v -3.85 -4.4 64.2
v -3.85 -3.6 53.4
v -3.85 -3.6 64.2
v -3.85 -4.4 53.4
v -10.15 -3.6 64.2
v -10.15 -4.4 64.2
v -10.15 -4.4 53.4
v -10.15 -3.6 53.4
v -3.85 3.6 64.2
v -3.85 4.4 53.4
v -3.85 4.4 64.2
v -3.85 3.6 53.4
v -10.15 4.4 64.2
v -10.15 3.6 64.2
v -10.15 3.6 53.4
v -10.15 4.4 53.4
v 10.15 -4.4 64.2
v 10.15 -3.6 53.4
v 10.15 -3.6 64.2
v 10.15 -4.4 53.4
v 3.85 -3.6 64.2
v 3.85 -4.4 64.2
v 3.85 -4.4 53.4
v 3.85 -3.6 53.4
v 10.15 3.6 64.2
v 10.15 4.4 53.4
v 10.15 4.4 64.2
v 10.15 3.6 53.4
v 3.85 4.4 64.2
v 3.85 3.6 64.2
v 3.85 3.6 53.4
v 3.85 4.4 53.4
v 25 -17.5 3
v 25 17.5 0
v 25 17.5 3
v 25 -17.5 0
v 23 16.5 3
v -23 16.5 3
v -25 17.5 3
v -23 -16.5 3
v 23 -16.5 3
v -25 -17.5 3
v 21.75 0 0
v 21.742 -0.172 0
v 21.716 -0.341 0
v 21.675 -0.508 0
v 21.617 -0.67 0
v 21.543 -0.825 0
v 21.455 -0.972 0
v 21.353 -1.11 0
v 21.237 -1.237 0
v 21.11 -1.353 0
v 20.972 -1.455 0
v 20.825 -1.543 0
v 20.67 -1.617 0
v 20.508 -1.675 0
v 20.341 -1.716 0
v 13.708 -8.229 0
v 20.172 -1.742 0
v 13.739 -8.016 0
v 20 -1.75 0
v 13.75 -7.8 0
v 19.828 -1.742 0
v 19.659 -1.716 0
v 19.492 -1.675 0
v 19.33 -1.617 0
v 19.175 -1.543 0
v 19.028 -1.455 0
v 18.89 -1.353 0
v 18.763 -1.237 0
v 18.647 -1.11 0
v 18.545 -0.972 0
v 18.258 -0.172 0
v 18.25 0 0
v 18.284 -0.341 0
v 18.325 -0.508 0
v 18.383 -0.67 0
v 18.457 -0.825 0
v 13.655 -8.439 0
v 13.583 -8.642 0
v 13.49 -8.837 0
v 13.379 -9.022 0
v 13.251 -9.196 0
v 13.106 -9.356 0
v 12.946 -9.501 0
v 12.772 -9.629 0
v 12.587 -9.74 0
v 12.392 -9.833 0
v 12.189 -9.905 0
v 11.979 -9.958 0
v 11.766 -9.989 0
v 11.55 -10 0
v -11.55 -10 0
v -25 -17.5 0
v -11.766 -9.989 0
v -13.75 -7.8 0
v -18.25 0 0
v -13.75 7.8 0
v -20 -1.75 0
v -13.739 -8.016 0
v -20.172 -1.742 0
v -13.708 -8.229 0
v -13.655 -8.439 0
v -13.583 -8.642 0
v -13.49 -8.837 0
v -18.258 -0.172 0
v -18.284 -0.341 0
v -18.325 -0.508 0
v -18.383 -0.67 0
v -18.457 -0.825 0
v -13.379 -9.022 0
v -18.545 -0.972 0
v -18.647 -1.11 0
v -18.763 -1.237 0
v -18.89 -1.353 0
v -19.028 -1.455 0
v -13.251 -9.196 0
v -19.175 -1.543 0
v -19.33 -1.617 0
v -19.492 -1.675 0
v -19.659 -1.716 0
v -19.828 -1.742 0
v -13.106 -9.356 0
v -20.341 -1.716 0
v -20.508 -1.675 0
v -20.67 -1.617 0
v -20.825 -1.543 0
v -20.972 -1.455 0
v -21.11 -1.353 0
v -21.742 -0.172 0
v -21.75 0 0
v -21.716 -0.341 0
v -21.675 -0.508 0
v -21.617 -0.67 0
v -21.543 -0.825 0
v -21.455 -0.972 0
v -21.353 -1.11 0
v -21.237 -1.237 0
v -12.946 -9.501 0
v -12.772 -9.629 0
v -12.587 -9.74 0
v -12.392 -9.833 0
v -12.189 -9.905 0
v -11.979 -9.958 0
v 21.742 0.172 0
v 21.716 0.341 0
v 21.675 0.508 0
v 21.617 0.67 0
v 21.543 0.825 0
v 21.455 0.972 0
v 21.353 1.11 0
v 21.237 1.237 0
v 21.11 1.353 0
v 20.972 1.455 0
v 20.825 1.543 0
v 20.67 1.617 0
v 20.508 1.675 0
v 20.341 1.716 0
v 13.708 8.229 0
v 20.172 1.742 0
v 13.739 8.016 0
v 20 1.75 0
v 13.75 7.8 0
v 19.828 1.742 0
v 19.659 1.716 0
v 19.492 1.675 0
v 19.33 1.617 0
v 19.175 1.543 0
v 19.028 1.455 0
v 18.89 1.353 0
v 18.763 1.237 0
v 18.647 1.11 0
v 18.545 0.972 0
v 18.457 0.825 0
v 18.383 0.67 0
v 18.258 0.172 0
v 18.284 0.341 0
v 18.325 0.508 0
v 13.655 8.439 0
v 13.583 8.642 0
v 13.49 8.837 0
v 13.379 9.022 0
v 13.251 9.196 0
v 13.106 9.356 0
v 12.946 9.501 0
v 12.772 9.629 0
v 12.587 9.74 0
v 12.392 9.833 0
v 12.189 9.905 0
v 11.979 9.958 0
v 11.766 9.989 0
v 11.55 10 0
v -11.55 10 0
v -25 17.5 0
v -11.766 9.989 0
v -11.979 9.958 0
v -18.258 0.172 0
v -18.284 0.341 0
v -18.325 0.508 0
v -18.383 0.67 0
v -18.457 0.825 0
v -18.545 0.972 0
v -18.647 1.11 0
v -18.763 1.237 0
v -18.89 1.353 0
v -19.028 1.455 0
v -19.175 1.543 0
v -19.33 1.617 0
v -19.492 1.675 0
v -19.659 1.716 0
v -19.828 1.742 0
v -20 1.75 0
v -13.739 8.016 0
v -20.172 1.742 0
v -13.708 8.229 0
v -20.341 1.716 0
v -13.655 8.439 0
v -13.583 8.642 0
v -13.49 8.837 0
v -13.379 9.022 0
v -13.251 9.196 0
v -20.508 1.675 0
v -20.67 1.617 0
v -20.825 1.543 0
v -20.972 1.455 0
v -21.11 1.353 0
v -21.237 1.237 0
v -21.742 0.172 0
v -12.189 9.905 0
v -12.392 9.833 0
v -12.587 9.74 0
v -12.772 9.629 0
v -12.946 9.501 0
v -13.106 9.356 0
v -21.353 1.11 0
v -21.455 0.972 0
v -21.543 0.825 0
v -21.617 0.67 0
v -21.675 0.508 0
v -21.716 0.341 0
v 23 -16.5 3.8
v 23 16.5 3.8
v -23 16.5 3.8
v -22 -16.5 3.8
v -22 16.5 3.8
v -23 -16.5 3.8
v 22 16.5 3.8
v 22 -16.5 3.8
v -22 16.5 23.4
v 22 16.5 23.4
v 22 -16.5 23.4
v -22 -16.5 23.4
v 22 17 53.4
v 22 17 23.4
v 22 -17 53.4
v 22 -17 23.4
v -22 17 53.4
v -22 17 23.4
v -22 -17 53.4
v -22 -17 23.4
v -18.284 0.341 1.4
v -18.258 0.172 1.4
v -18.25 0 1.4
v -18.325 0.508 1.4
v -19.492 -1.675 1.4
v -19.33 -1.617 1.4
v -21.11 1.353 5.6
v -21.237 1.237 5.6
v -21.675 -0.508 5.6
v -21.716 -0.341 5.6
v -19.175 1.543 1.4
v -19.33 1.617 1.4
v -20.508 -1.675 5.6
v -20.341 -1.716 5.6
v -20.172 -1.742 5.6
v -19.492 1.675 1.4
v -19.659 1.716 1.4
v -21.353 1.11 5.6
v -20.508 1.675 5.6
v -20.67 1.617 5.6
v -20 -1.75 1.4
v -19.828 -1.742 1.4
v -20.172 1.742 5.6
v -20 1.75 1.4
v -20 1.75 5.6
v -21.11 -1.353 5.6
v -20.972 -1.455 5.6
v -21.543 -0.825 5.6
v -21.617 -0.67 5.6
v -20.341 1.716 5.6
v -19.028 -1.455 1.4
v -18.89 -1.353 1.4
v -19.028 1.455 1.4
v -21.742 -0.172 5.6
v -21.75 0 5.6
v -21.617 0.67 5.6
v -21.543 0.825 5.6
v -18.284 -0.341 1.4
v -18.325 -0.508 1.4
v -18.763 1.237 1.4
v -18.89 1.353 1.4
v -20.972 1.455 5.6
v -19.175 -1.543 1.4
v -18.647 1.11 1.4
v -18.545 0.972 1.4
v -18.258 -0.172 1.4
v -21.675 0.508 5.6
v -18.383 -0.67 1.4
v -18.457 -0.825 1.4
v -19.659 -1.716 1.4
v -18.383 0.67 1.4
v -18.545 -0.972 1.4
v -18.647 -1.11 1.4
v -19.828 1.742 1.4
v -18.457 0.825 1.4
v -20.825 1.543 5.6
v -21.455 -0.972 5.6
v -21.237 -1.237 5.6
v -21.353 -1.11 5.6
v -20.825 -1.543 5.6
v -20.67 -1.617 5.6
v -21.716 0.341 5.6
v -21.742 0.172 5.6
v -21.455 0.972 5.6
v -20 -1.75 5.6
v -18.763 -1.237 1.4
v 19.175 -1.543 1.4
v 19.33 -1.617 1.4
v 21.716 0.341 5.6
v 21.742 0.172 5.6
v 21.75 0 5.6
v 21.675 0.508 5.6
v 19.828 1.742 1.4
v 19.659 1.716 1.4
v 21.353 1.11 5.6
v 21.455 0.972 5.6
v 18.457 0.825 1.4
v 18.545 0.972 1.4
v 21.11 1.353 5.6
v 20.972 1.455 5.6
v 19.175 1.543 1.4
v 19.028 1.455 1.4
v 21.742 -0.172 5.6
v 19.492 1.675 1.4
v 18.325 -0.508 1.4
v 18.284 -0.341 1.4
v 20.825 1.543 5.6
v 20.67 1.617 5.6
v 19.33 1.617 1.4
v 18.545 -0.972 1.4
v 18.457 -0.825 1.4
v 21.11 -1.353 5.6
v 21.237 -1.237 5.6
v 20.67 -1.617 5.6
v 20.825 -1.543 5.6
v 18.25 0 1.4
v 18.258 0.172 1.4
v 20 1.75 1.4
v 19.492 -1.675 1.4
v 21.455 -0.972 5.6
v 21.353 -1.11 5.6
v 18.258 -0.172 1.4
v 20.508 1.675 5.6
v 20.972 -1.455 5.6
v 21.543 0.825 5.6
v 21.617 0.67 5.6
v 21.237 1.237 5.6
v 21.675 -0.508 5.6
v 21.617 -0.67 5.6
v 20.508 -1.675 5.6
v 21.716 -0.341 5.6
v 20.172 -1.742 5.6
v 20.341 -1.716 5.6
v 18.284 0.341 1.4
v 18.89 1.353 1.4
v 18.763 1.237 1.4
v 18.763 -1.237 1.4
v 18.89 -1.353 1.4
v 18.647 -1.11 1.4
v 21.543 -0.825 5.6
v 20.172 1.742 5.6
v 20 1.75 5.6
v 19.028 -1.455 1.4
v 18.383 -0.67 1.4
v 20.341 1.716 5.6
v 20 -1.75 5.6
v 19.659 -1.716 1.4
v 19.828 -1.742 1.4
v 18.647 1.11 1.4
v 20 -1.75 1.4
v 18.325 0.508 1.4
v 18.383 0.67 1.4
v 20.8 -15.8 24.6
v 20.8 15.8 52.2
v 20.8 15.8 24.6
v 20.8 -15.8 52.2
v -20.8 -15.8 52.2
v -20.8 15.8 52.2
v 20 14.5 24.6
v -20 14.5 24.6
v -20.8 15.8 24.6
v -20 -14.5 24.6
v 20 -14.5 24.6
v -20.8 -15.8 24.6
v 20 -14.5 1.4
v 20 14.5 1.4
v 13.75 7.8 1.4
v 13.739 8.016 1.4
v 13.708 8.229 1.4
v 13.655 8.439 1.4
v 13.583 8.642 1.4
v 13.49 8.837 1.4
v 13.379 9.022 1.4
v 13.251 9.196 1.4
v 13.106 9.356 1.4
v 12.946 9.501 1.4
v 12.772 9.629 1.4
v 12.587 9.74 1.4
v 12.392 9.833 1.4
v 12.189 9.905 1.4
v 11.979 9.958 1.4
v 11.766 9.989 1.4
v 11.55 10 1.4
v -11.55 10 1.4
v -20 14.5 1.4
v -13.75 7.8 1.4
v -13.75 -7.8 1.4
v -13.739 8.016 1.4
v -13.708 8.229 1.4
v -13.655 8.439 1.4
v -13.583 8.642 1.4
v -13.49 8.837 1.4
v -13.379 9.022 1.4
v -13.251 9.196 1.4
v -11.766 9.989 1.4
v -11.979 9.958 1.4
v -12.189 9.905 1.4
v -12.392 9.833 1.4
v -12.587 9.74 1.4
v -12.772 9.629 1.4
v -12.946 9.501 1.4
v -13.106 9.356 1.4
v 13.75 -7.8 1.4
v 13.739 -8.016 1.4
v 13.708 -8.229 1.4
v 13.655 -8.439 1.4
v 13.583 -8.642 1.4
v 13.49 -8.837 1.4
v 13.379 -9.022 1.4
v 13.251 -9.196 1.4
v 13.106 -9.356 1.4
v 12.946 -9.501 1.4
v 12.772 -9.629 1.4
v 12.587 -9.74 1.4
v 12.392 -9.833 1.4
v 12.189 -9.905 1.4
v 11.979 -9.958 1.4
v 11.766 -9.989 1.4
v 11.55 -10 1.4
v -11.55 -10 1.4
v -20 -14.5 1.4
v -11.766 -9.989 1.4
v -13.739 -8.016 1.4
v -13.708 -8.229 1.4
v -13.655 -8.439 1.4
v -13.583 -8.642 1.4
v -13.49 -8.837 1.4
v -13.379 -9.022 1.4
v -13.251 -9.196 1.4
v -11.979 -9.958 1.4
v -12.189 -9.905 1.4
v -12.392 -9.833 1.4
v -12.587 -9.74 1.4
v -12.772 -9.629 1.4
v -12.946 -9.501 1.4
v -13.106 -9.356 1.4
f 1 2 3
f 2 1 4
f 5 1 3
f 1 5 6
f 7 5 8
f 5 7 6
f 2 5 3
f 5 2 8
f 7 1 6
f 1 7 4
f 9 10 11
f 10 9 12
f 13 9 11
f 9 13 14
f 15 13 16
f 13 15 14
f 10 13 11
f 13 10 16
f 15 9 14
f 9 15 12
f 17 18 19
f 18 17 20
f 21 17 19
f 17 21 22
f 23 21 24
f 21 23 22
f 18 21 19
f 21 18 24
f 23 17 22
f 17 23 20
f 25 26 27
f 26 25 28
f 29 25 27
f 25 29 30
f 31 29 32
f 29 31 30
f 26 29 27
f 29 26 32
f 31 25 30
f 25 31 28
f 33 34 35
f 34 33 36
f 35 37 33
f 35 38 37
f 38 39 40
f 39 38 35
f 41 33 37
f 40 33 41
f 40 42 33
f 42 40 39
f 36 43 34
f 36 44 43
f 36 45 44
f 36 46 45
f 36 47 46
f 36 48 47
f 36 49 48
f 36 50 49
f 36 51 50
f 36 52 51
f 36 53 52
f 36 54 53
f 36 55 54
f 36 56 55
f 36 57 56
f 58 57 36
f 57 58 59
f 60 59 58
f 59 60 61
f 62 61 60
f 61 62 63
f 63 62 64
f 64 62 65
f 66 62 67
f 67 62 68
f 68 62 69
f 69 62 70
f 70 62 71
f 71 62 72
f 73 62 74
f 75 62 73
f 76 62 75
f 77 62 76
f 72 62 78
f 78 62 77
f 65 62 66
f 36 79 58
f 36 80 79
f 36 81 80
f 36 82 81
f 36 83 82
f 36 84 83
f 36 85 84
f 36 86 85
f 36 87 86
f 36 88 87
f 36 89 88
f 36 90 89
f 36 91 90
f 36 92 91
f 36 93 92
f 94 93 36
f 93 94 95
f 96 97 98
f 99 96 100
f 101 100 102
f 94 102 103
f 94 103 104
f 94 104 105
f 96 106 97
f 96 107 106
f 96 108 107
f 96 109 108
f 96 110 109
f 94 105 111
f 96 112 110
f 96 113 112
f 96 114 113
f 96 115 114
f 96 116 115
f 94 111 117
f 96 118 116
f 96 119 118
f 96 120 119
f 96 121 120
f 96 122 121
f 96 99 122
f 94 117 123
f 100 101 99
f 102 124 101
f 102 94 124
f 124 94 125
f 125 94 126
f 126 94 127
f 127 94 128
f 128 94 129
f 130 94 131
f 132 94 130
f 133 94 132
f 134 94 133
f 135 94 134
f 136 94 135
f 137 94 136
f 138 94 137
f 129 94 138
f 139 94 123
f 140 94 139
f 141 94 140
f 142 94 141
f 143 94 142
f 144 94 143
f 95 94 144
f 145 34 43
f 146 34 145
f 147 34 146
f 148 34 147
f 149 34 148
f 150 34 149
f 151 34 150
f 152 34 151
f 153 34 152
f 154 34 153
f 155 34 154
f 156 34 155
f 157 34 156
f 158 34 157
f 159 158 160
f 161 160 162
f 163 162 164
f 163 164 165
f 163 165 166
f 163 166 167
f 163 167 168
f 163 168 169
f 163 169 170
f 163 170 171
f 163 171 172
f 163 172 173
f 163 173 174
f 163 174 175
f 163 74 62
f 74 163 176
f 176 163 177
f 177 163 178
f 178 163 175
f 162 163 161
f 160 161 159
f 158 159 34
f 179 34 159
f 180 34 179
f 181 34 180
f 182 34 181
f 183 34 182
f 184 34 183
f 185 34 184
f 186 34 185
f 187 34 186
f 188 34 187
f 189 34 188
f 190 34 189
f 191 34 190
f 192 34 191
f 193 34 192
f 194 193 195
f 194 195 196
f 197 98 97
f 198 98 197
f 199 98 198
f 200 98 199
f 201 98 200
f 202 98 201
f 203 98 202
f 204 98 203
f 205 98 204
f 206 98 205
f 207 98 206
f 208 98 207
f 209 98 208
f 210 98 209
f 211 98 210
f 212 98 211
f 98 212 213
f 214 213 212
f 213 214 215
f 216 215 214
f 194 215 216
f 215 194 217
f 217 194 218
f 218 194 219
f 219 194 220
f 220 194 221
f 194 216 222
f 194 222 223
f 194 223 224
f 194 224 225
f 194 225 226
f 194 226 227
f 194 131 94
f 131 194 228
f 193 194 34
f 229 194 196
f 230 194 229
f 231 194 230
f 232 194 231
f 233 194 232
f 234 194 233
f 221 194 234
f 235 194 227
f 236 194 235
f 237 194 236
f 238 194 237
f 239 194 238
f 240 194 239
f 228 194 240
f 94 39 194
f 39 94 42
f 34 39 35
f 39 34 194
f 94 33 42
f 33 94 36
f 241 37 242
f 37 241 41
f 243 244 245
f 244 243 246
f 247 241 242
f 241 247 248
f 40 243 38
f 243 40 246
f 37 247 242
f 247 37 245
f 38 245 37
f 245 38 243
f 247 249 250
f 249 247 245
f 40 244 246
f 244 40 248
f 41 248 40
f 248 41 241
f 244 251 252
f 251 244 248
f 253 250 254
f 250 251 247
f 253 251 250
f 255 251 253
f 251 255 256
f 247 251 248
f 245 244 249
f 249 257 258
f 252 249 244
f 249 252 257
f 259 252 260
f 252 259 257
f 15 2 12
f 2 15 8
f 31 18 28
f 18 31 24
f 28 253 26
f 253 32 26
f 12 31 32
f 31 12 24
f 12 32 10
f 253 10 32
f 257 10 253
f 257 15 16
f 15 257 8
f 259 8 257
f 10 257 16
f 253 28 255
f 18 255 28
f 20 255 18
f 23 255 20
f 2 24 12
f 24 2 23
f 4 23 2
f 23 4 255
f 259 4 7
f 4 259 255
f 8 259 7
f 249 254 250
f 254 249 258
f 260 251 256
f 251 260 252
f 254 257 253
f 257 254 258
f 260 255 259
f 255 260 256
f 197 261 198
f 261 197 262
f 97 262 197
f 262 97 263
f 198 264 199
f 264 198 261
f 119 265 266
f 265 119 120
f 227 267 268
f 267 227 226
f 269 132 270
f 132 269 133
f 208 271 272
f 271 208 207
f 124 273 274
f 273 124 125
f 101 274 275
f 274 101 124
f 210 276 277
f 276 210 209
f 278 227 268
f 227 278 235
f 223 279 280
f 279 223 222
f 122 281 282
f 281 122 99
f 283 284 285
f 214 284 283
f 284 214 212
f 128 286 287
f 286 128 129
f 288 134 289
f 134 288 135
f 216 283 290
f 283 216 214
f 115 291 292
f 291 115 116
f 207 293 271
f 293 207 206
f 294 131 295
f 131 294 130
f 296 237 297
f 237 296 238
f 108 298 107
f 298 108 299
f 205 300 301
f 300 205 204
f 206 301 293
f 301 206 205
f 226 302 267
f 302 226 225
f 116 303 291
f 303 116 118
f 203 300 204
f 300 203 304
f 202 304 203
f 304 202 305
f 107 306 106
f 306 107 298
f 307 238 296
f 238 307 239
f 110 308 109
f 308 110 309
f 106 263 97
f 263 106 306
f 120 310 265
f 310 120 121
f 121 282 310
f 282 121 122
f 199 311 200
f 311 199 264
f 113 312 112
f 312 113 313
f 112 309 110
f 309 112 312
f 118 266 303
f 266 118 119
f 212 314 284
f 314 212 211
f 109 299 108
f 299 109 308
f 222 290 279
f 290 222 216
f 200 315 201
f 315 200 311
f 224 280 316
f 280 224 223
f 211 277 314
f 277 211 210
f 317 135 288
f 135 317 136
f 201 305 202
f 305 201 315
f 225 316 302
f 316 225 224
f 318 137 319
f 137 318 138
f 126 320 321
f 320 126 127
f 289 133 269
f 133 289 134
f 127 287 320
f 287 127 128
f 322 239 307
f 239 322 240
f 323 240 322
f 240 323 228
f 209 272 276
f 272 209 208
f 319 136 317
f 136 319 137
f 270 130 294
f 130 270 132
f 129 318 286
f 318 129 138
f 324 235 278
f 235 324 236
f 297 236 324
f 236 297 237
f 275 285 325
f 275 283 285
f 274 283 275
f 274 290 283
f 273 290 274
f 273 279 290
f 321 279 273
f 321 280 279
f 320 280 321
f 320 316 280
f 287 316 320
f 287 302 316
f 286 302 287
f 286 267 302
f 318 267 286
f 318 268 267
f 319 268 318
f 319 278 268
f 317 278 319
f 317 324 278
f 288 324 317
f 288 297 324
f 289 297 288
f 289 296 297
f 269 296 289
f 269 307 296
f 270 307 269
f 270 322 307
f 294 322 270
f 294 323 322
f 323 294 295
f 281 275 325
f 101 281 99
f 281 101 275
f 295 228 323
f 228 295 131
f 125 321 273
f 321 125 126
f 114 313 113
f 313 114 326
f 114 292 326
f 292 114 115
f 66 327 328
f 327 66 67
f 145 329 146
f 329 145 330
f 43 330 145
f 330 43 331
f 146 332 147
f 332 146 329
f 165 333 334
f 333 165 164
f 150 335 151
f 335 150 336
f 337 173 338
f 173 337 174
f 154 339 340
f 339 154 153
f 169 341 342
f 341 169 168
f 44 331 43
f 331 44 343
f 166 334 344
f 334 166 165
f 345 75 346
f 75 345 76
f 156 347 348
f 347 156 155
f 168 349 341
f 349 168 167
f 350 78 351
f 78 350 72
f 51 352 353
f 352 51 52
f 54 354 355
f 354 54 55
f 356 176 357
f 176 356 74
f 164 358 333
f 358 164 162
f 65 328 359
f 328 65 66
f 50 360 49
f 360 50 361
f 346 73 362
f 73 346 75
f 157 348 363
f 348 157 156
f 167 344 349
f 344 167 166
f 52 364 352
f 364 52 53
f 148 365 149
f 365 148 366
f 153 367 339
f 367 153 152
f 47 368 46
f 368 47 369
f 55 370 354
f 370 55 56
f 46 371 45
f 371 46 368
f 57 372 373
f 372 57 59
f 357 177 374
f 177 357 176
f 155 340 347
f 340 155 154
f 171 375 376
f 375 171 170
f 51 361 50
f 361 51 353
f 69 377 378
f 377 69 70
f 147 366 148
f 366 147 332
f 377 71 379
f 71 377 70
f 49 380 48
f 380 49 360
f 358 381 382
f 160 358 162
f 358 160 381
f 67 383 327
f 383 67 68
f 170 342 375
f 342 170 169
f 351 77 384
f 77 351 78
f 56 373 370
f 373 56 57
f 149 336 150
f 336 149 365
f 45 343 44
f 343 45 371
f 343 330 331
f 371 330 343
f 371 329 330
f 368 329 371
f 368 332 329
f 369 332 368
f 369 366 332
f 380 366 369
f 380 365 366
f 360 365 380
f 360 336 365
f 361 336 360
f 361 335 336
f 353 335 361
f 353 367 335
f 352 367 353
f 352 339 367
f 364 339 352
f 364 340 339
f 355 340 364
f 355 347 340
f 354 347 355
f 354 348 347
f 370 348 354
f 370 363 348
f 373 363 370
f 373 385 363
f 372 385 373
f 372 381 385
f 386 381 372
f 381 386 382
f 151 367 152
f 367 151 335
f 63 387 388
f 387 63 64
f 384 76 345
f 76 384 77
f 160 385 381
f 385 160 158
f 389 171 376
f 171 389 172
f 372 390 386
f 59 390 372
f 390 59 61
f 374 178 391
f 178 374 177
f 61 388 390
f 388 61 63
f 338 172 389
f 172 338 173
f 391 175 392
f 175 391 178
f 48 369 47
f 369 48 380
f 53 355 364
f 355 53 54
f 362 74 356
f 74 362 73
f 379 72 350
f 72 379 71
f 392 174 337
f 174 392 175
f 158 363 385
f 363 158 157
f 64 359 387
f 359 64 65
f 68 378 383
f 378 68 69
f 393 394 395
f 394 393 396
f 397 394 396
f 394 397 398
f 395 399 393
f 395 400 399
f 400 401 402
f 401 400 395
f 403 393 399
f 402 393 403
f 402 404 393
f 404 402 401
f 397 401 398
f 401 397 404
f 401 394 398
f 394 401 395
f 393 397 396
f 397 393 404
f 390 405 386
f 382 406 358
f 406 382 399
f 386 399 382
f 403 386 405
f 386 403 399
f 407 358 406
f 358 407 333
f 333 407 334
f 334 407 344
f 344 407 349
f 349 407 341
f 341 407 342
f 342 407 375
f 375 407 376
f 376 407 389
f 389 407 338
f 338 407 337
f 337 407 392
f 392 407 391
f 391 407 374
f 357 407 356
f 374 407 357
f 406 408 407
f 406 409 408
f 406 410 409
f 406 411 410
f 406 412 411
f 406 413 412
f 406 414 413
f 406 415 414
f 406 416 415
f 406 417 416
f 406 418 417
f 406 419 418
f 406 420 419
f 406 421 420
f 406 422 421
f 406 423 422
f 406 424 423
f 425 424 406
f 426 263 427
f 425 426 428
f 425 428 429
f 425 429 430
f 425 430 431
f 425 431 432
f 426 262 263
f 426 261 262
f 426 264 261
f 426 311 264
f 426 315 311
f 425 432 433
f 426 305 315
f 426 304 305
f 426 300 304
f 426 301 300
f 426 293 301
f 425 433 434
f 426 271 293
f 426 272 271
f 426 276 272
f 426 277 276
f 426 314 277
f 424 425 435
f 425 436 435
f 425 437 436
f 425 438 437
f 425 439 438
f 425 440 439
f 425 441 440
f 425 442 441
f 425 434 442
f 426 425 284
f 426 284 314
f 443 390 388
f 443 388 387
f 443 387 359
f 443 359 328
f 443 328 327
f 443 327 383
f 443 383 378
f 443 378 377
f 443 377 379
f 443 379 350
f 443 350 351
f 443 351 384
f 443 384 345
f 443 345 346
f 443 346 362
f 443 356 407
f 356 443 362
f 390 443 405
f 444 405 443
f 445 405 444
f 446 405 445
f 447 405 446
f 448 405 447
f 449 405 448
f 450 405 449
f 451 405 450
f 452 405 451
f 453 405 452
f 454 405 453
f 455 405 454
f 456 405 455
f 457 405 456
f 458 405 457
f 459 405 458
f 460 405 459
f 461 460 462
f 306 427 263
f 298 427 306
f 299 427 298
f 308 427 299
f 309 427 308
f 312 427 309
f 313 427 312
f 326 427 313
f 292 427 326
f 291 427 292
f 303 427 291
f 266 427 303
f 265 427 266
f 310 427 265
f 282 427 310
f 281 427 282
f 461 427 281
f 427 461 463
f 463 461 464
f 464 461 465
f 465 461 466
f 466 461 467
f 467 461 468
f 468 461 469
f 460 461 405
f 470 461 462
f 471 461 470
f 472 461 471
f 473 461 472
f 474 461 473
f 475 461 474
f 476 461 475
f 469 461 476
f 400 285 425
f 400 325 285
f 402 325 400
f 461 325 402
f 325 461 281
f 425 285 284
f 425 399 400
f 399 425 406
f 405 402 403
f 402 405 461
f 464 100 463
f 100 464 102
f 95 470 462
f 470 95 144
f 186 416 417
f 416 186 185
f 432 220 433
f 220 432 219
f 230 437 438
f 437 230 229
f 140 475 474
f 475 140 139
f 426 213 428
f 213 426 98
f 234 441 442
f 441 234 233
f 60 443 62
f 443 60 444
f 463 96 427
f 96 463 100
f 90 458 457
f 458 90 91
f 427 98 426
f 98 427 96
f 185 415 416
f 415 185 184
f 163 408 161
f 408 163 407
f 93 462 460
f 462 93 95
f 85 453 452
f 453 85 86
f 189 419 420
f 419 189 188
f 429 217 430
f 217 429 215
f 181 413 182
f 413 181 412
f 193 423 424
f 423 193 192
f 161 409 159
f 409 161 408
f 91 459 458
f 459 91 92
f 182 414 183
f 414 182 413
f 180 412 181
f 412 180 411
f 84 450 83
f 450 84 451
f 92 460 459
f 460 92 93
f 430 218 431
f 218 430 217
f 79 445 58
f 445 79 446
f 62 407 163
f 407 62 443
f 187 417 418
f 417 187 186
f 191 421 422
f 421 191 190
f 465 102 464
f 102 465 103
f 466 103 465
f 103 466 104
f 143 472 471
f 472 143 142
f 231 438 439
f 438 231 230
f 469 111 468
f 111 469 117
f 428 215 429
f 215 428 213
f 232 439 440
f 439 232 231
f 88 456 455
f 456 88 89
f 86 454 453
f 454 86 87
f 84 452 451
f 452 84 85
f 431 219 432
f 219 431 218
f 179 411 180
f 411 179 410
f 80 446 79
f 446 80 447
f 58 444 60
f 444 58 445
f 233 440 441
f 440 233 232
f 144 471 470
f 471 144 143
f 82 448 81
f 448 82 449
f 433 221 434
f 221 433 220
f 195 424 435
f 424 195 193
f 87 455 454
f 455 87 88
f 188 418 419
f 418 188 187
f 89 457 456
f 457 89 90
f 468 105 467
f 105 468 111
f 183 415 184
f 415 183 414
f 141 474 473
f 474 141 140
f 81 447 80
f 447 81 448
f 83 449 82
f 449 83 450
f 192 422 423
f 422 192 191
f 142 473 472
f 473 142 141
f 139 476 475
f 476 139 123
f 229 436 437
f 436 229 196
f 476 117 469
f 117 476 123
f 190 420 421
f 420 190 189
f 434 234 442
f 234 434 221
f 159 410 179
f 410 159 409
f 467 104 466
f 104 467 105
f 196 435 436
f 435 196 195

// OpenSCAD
$fn = 64;

// ===== IEC filtered power inlet module (C14 style) =====
// Requested panel cutout: 40.0mm x 29.0mm
// Structural fix: ensure the expected part "iec" exists and is a single connected solid.
// Also increase overlap to 1.2mm and recalc Z placements so every part intersects.

panel_cutout_w = 40.0;
panel_cutout_h = 29.0;

flange_w = 50.0;
flange_h = 35.0;
flange_t = 3.0;

bezel_w  = 46.0;
bezel_h  = 33.0;
bezel_t  = 2.0;

body_depth = 22.0;
body_wall  = 2.0;

rear_can_w = 44.0;
rear_can_h = 34.0;
rear_can_d = 30.0;
rear_can_wall = 1.2;

// Use 1–2mm overlap to guarantee watertight unions
overlap = 1.2;

// --- IEC C14 opening (approx, for recognizable geometry)
c14_open_w = 27.5;
c14_open_h = 20.0;
c14_corner_r = 2.2;
c14_recess_depth = 4.0;

// --- Pin slots (approx)
slot_w = 6.2;
slot_h = 2.2;
slot_depth = 8.0;
slot_pitch_x = 14.0;
slot_pitch_y = 8.0;

// --- Mounting holes (typical flange holes)
screw_d = 3.5;
screw_pitch_x = 40.0;
screw_pitch_y = 0.0;

// --- Spade terminals (rear)
spade_w = 6.3;
spade_t = 0.8;
spade_len = 12.0;
spade_spacing_x = 14.0;
spade_spacing_y = 8.0;

// --- Recalculated Z positions (front face at z=0, positive z goes "back")
// Place parts so they overlap by 'overlap' at each interface.
z_flange_center = flange_t/2;

// Bezel overlaps flange by 'overlap'
z_bezel_center  = flange_t + bezel_t/2 - overlap;

// Body overlaps bezel by 'overlap'
z_body_center   = flange_t + bezel_t + body_depth/2 - 2*overlap;

// Rear can overlaps body by 'overlap'
z_rear_center   = flange_t + bezel_t + body_depth + rear_can_d/2 - 3*overlap;

// Rear face of rear can (for terminals)
z_rear_back_face = z_rear_center + rear_can_d/2;

// ===== Helpers =====
module rounded_rect_2d(w,h,r){
  r2 = min(r, min(w,h)/2);
  hull(){
    for (sx=[-1,1], sy=[-1,1])
      translate([sx*(w/2-r2), sy*(h/2-r2)]) circle(r=r2);
  }
}

// ===== Expected part: iec =====
module iec(){
  // Build a connected outer union, then subtract openings/holes.
  difference(){
    union(){
      // Front flange
      translate([0,0,z_flange_center])
        cube([flange_w, flange_h, flange_t], center=true);

      // Bezel (overlaps flange)
      translate([0,0,z_bezel_center])
        cube([bezel_w, bezel_h, bezel_t], center=true);

      // Main body outer (matches requested panel cutout + wall) (overlaps bezel)
      translate([0,0,z_body_center])
        cube([panel_cutout_w + 2*body_wall,
              panel_cutout_h + 2*body_wall,
              body_depth], center=true);

      // Rear filter can outer (overlaps body)
      translate([0,0,z_rear_center])
        cube([rear_can_w, rear_can_h, rear_can_d], center=true);

      // Spade terminals: ensure they intersect rear can by 'overlap'
      // Put their front face slightly inside the rear can back face.
      for (sx=[-1,1], sy=[-1,1]){
        translate([sx*spade_spacing_x/2,
                   sy*spade_spacing_y/2,
                   z_rear_back_face + spade_len/2 - overlap])
          cube([spade_w, spade_t, spade_len], center=true);
      }
    }

    // --- Hollow out rear can (leave wall thickness)
    translate([0,0,z_rear_center])
      cube([rear_can_w - 2*rear_can_wall,
            rear_can_h - 2*rear_can_wall,
            rear_can_d - 2*rear_can_wall], center=true);

    // --- Panel cutout passage through body (through-hole)
    translate([0,0,z_body_center])
      cube([panel_cutout_w,
            panel_cutout_h,
            body_depth + 2*overlap], center=true);

    // --- IEC C14 recessed opening in bezel
    // Cut from the front into the bezel by c14_recess_depth.
    // Center the cut within the bezel thickness, biased toward the front.
    translate([0,0, flange_t + bezel_t/2 - c14_recess_depth/2])
      linear_extrude(height=c14_recess_depth + 2*overlap, center=true)
        rounded_rect_2d(c14_open_w, c14_open_h, c14_corner_r);

    // --- Pin slots (3 slots: L, N, Earth)
    // Cut from front into bezel+body by slot_depth.
    translate_z_slots = flange_t + bezel_t/2 - slot_depth/2;
    for (sx=[-1,1]){
      translate([sx*slot_pitch_x/2,
                 -slot_pitch_y/2,
                 translate_z_slots])
        cube([slot_w, slot_h, slot_depth + 2*overlap], center=true);
    }
    translate([0,
               slot_pitch_y/2,
               translate_z_slots])
      cube([slot_w, slot_h, slot_depth + 2*overlap], center=true);

    // --- Mounting holes through flange+bezel
    // Center the drill through the combined thickness.
    z_hole_center = (flange_t + bezel_t)/2 - overlap/2;
    for (sx=[-1,1]){
      translate([sx*screw_pitch_x/2, screw_pitch_y/2, z_hole_center])
        cylinder(d=screw_d, h=flange_t + bezel_t + 2*overlap, center=true);
    }
  }
}

// Render the expected part
iec();
